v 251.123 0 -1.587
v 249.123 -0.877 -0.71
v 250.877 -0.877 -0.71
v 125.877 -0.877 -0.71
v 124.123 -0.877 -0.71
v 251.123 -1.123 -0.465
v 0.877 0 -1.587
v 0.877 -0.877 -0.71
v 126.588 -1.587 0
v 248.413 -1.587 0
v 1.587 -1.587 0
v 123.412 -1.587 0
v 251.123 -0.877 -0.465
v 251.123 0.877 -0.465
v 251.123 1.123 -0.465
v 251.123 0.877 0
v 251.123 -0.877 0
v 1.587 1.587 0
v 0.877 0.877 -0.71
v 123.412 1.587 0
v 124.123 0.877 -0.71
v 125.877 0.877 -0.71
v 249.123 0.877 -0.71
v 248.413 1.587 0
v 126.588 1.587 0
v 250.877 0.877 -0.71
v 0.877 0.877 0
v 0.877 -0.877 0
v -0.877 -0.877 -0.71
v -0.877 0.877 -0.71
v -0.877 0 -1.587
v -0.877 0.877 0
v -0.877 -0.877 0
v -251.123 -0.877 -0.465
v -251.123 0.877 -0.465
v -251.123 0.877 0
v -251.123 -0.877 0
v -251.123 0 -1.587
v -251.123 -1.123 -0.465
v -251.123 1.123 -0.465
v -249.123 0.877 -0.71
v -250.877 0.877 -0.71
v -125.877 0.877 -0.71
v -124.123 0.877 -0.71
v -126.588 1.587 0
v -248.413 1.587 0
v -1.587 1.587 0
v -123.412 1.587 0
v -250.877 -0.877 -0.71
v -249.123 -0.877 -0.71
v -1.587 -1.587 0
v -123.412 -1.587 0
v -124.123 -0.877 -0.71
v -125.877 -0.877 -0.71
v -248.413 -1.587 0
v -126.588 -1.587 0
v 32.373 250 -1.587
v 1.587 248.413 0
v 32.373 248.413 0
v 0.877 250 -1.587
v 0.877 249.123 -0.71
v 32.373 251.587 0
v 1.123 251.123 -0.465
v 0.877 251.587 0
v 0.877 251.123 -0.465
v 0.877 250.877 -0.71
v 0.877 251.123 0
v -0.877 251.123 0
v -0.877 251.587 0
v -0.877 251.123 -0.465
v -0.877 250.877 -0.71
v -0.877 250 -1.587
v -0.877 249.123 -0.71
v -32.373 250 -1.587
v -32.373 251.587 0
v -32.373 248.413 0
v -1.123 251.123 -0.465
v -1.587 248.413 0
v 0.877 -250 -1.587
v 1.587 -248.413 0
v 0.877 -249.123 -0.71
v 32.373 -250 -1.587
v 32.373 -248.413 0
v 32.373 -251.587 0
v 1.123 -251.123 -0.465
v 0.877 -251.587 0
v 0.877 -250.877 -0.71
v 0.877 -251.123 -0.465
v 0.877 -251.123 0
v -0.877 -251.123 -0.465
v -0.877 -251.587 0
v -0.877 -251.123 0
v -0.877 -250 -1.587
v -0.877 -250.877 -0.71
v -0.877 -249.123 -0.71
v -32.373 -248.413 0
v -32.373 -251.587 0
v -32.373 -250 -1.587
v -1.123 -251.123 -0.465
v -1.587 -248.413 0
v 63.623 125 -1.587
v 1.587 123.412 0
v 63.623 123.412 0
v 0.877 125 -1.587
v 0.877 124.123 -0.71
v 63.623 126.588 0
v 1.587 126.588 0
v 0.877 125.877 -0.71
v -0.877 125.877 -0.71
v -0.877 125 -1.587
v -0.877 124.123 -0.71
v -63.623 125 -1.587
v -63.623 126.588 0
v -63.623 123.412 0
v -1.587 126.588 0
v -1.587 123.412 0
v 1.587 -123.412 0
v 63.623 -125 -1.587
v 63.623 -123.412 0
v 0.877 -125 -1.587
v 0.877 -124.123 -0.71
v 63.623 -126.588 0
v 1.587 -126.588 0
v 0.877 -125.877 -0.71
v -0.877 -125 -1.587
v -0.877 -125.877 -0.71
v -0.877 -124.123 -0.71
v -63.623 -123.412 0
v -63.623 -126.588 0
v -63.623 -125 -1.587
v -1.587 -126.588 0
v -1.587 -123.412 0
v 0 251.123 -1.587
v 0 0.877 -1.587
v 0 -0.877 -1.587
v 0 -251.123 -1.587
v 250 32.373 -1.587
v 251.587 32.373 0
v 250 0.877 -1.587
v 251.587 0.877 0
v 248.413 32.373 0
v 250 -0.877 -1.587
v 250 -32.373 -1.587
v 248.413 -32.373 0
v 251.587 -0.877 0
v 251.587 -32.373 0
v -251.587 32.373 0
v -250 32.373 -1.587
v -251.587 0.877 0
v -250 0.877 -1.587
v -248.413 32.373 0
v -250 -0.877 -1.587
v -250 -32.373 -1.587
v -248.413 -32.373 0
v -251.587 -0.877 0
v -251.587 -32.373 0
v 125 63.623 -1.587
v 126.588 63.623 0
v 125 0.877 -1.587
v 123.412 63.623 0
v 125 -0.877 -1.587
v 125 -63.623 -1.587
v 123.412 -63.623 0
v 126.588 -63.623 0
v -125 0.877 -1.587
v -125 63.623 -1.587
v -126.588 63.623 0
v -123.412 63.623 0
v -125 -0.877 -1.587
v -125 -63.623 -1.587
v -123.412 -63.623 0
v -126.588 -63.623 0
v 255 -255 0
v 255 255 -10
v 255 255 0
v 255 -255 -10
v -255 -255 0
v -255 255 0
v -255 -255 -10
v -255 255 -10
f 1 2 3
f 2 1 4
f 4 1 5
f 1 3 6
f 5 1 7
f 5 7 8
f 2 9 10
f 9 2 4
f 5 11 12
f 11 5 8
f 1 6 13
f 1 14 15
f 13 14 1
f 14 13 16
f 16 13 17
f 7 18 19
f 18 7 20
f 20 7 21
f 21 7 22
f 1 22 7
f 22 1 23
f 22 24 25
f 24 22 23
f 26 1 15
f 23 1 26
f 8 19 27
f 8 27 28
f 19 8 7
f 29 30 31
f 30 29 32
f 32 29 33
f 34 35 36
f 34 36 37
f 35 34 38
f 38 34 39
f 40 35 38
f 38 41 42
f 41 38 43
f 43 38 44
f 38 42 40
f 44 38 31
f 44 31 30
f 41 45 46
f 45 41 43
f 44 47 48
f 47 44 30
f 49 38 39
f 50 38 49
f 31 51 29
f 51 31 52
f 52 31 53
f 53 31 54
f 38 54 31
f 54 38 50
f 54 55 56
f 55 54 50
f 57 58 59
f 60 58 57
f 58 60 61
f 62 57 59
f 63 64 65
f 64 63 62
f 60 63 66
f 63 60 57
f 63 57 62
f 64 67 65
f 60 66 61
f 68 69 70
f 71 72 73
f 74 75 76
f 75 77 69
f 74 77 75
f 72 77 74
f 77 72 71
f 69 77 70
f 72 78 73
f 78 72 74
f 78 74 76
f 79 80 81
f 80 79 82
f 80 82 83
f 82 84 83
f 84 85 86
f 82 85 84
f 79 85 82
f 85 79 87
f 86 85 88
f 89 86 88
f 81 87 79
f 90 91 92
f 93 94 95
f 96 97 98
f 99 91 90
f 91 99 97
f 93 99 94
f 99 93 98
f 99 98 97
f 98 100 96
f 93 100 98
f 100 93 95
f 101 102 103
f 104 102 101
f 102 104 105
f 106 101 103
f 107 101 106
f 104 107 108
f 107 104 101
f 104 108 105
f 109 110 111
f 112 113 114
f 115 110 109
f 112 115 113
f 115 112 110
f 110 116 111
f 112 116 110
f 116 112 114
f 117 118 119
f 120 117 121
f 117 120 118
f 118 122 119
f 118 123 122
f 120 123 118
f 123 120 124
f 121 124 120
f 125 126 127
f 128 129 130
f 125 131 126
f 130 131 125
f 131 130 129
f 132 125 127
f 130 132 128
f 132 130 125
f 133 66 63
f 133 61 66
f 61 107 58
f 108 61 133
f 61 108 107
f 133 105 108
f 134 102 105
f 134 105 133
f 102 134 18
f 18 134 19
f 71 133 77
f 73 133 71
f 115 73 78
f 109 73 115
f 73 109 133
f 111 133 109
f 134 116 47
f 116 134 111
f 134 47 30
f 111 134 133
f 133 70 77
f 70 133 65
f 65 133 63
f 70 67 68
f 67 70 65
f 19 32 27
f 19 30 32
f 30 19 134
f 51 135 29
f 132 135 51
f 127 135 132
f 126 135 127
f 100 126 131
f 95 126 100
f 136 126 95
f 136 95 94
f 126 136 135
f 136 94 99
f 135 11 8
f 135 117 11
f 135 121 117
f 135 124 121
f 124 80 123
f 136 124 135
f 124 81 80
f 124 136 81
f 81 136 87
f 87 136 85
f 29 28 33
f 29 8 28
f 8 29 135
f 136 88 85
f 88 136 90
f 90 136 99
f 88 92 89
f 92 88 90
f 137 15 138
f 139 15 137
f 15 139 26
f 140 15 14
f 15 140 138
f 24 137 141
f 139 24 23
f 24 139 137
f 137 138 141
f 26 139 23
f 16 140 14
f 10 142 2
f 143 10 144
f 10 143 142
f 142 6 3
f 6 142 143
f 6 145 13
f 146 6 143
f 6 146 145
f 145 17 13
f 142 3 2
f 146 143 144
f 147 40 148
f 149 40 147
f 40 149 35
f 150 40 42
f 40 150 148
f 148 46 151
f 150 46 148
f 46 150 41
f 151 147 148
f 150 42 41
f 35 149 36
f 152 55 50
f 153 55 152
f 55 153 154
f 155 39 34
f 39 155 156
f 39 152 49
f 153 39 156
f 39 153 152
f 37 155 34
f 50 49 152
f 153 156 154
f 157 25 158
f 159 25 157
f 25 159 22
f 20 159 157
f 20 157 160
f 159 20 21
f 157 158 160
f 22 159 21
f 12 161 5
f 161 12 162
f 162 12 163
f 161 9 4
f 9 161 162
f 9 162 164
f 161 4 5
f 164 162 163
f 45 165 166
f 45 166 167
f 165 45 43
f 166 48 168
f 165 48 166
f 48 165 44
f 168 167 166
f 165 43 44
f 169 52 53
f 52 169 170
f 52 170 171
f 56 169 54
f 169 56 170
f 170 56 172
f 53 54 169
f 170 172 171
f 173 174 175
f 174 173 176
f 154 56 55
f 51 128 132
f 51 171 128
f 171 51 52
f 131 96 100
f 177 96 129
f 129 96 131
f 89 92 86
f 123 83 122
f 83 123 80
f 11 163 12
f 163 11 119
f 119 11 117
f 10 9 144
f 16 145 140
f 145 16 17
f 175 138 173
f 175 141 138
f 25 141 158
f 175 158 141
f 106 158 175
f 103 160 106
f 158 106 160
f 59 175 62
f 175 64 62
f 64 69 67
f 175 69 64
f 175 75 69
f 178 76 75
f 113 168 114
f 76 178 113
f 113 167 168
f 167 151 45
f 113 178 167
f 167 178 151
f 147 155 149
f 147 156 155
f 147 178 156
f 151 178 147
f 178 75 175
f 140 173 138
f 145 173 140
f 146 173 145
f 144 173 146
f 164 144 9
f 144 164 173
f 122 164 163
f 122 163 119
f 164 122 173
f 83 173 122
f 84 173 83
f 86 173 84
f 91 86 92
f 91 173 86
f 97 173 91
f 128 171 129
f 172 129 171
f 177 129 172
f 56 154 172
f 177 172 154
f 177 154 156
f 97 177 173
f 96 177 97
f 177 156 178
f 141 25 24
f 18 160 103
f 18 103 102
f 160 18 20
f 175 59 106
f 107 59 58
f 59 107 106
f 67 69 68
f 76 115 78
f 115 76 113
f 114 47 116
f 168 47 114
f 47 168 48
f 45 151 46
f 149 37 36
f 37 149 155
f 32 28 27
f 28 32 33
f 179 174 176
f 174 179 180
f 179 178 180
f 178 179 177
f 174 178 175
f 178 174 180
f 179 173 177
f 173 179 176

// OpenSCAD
// file: ../extensions/mirror_translate.scad
// Mirrors the object translation
module mirror_translate(translation, copy=true) {
  if (copy) translate(translation) children();
  // mirror only what we moved
  m = [for (e = translation) e != 0 ? 1 : 0];
  mirror(m) translate(translation) children();
}
// main file
use <../extensions/mirror_translate.scad>

// I tried to carve it with a sphere (which would be easier), but Kiri:Moto
// didn't like it. So I switched to this cut and Kiri:Motot trace, which also
// didn't work until I separated all the lines.
//
// It becomes overly complex, but it worked.

$fn = 50;
radius = 1/2 * 1/8 * 25.4;

size = 500;

module carver_x() {
  rotate([45, 0, 0])
  linear_extrude(sin(45) * radius * 2, center=true)
  square(sin(45) * radius * 2, center=true);
}

module carver_y() {
  rotate([0, 0, 90]) carver_x();
}

module ruler_x(width) {
  hull() union() {
    translate([width / 2, 0, 0]) carver_x();
    translate([2, 0, 0]) carver_x();
  }
  hull() union() {
    translate([-width / 2, 0, 0]) carver_x();
    translate([-2, 0, 0]) carver_x();
  }
}

module ruler_y(width) {
  hull() union() {
    translate([0, width / 2, 0]) carver_y();
    translate([0, 2, 0]) carver_y();
  }
  hull() union() {
    translate([0, -width / 2, 0]) carver_y();
    translate([0, -2, 0]) carver_y();
  }
}

difference() {
  translate([0, 0, -5]) cube([size + 10, size + 10, 10], center=true);

  ruler_x(size);
  mirror_translate([0, size / 2, 0]) ruler_x(size / 8);
  mirror_translate([0, size / 4, 0]) ruler_x(size / 4);

  ruler_y(size);
  mirror_translate([size / 2, 0, 0]) ruler_y(size / 8);
  mirror_translate([size / 4, 0, 0]) ruler_y(size / 4);
}
